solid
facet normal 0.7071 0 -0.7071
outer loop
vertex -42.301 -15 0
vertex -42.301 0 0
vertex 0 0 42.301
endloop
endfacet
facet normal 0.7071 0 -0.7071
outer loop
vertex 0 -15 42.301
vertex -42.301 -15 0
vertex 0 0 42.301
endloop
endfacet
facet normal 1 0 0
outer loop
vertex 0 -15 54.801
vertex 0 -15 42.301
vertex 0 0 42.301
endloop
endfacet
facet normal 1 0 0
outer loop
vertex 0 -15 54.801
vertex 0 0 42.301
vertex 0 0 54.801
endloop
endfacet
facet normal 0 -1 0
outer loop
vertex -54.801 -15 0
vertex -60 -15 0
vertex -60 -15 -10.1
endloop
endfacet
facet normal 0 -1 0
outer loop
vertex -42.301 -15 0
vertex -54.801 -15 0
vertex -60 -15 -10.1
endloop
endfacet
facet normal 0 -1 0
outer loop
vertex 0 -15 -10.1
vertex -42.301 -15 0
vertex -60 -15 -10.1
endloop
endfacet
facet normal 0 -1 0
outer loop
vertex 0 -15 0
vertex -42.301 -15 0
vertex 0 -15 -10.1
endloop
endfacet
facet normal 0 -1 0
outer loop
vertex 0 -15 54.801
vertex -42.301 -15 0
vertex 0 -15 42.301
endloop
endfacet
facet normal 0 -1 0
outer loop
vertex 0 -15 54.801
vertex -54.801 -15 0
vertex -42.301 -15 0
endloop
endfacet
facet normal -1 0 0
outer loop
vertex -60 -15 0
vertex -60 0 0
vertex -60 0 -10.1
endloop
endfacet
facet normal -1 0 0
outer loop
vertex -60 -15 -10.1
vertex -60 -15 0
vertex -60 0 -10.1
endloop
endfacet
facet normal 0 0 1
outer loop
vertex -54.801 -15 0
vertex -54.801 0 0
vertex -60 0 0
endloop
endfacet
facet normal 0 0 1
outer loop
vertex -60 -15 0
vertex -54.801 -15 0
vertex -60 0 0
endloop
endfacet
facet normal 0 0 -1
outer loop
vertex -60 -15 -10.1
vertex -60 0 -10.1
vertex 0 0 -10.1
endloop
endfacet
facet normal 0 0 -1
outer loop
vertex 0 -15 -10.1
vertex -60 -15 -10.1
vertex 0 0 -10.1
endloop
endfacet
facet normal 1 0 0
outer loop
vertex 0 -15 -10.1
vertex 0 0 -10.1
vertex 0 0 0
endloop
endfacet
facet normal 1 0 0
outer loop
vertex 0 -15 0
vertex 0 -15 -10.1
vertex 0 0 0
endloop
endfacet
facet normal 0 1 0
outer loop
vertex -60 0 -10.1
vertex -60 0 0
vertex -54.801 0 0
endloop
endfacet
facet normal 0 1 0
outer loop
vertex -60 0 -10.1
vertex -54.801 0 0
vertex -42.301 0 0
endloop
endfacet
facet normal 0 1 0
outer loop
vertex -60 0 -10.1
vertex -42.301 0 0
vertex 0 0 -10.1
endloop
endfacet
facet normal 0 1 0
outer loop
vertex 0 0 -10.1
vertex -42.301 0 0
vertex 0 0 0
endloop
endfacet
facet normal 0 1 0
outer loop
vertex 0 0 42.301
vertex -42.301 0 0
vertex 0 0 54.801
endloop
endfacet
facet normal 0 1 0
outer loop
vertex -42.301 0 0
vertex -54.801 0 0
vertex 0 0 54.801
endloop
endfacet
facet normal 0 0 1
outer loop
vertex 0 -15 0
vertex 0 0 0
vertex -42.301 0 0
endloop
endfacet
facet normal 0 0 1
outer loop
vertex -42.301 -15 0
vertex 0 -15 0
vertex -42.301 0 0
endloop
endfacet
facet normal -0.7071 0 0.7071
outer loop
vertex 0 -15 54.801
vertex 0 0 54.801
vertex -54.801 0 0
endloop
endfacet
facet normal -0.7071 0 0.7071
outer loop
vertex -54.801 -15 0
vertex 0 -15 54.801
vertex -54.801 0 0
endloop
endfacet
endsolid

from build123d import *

# Parameters (mm, degrees)
F1_DEPTH = 15


with BuildPart() as f1:
    # F0 (on Front) → F1 (new body)
    with BuildSketch(Plane.XZ):
        Polygon((0, 42.300776), (0, 54.800776), (-54.800776, 0), (-42.300776, 0), align=None)
        Polygon((-42.300776, 0), (-54.800776, 0), (-60, 0), (-60, -10.1), (0, -10.1), (0, 0), align=None)
    extrude(amount=F1_DEPTH)


solid = f1.part
